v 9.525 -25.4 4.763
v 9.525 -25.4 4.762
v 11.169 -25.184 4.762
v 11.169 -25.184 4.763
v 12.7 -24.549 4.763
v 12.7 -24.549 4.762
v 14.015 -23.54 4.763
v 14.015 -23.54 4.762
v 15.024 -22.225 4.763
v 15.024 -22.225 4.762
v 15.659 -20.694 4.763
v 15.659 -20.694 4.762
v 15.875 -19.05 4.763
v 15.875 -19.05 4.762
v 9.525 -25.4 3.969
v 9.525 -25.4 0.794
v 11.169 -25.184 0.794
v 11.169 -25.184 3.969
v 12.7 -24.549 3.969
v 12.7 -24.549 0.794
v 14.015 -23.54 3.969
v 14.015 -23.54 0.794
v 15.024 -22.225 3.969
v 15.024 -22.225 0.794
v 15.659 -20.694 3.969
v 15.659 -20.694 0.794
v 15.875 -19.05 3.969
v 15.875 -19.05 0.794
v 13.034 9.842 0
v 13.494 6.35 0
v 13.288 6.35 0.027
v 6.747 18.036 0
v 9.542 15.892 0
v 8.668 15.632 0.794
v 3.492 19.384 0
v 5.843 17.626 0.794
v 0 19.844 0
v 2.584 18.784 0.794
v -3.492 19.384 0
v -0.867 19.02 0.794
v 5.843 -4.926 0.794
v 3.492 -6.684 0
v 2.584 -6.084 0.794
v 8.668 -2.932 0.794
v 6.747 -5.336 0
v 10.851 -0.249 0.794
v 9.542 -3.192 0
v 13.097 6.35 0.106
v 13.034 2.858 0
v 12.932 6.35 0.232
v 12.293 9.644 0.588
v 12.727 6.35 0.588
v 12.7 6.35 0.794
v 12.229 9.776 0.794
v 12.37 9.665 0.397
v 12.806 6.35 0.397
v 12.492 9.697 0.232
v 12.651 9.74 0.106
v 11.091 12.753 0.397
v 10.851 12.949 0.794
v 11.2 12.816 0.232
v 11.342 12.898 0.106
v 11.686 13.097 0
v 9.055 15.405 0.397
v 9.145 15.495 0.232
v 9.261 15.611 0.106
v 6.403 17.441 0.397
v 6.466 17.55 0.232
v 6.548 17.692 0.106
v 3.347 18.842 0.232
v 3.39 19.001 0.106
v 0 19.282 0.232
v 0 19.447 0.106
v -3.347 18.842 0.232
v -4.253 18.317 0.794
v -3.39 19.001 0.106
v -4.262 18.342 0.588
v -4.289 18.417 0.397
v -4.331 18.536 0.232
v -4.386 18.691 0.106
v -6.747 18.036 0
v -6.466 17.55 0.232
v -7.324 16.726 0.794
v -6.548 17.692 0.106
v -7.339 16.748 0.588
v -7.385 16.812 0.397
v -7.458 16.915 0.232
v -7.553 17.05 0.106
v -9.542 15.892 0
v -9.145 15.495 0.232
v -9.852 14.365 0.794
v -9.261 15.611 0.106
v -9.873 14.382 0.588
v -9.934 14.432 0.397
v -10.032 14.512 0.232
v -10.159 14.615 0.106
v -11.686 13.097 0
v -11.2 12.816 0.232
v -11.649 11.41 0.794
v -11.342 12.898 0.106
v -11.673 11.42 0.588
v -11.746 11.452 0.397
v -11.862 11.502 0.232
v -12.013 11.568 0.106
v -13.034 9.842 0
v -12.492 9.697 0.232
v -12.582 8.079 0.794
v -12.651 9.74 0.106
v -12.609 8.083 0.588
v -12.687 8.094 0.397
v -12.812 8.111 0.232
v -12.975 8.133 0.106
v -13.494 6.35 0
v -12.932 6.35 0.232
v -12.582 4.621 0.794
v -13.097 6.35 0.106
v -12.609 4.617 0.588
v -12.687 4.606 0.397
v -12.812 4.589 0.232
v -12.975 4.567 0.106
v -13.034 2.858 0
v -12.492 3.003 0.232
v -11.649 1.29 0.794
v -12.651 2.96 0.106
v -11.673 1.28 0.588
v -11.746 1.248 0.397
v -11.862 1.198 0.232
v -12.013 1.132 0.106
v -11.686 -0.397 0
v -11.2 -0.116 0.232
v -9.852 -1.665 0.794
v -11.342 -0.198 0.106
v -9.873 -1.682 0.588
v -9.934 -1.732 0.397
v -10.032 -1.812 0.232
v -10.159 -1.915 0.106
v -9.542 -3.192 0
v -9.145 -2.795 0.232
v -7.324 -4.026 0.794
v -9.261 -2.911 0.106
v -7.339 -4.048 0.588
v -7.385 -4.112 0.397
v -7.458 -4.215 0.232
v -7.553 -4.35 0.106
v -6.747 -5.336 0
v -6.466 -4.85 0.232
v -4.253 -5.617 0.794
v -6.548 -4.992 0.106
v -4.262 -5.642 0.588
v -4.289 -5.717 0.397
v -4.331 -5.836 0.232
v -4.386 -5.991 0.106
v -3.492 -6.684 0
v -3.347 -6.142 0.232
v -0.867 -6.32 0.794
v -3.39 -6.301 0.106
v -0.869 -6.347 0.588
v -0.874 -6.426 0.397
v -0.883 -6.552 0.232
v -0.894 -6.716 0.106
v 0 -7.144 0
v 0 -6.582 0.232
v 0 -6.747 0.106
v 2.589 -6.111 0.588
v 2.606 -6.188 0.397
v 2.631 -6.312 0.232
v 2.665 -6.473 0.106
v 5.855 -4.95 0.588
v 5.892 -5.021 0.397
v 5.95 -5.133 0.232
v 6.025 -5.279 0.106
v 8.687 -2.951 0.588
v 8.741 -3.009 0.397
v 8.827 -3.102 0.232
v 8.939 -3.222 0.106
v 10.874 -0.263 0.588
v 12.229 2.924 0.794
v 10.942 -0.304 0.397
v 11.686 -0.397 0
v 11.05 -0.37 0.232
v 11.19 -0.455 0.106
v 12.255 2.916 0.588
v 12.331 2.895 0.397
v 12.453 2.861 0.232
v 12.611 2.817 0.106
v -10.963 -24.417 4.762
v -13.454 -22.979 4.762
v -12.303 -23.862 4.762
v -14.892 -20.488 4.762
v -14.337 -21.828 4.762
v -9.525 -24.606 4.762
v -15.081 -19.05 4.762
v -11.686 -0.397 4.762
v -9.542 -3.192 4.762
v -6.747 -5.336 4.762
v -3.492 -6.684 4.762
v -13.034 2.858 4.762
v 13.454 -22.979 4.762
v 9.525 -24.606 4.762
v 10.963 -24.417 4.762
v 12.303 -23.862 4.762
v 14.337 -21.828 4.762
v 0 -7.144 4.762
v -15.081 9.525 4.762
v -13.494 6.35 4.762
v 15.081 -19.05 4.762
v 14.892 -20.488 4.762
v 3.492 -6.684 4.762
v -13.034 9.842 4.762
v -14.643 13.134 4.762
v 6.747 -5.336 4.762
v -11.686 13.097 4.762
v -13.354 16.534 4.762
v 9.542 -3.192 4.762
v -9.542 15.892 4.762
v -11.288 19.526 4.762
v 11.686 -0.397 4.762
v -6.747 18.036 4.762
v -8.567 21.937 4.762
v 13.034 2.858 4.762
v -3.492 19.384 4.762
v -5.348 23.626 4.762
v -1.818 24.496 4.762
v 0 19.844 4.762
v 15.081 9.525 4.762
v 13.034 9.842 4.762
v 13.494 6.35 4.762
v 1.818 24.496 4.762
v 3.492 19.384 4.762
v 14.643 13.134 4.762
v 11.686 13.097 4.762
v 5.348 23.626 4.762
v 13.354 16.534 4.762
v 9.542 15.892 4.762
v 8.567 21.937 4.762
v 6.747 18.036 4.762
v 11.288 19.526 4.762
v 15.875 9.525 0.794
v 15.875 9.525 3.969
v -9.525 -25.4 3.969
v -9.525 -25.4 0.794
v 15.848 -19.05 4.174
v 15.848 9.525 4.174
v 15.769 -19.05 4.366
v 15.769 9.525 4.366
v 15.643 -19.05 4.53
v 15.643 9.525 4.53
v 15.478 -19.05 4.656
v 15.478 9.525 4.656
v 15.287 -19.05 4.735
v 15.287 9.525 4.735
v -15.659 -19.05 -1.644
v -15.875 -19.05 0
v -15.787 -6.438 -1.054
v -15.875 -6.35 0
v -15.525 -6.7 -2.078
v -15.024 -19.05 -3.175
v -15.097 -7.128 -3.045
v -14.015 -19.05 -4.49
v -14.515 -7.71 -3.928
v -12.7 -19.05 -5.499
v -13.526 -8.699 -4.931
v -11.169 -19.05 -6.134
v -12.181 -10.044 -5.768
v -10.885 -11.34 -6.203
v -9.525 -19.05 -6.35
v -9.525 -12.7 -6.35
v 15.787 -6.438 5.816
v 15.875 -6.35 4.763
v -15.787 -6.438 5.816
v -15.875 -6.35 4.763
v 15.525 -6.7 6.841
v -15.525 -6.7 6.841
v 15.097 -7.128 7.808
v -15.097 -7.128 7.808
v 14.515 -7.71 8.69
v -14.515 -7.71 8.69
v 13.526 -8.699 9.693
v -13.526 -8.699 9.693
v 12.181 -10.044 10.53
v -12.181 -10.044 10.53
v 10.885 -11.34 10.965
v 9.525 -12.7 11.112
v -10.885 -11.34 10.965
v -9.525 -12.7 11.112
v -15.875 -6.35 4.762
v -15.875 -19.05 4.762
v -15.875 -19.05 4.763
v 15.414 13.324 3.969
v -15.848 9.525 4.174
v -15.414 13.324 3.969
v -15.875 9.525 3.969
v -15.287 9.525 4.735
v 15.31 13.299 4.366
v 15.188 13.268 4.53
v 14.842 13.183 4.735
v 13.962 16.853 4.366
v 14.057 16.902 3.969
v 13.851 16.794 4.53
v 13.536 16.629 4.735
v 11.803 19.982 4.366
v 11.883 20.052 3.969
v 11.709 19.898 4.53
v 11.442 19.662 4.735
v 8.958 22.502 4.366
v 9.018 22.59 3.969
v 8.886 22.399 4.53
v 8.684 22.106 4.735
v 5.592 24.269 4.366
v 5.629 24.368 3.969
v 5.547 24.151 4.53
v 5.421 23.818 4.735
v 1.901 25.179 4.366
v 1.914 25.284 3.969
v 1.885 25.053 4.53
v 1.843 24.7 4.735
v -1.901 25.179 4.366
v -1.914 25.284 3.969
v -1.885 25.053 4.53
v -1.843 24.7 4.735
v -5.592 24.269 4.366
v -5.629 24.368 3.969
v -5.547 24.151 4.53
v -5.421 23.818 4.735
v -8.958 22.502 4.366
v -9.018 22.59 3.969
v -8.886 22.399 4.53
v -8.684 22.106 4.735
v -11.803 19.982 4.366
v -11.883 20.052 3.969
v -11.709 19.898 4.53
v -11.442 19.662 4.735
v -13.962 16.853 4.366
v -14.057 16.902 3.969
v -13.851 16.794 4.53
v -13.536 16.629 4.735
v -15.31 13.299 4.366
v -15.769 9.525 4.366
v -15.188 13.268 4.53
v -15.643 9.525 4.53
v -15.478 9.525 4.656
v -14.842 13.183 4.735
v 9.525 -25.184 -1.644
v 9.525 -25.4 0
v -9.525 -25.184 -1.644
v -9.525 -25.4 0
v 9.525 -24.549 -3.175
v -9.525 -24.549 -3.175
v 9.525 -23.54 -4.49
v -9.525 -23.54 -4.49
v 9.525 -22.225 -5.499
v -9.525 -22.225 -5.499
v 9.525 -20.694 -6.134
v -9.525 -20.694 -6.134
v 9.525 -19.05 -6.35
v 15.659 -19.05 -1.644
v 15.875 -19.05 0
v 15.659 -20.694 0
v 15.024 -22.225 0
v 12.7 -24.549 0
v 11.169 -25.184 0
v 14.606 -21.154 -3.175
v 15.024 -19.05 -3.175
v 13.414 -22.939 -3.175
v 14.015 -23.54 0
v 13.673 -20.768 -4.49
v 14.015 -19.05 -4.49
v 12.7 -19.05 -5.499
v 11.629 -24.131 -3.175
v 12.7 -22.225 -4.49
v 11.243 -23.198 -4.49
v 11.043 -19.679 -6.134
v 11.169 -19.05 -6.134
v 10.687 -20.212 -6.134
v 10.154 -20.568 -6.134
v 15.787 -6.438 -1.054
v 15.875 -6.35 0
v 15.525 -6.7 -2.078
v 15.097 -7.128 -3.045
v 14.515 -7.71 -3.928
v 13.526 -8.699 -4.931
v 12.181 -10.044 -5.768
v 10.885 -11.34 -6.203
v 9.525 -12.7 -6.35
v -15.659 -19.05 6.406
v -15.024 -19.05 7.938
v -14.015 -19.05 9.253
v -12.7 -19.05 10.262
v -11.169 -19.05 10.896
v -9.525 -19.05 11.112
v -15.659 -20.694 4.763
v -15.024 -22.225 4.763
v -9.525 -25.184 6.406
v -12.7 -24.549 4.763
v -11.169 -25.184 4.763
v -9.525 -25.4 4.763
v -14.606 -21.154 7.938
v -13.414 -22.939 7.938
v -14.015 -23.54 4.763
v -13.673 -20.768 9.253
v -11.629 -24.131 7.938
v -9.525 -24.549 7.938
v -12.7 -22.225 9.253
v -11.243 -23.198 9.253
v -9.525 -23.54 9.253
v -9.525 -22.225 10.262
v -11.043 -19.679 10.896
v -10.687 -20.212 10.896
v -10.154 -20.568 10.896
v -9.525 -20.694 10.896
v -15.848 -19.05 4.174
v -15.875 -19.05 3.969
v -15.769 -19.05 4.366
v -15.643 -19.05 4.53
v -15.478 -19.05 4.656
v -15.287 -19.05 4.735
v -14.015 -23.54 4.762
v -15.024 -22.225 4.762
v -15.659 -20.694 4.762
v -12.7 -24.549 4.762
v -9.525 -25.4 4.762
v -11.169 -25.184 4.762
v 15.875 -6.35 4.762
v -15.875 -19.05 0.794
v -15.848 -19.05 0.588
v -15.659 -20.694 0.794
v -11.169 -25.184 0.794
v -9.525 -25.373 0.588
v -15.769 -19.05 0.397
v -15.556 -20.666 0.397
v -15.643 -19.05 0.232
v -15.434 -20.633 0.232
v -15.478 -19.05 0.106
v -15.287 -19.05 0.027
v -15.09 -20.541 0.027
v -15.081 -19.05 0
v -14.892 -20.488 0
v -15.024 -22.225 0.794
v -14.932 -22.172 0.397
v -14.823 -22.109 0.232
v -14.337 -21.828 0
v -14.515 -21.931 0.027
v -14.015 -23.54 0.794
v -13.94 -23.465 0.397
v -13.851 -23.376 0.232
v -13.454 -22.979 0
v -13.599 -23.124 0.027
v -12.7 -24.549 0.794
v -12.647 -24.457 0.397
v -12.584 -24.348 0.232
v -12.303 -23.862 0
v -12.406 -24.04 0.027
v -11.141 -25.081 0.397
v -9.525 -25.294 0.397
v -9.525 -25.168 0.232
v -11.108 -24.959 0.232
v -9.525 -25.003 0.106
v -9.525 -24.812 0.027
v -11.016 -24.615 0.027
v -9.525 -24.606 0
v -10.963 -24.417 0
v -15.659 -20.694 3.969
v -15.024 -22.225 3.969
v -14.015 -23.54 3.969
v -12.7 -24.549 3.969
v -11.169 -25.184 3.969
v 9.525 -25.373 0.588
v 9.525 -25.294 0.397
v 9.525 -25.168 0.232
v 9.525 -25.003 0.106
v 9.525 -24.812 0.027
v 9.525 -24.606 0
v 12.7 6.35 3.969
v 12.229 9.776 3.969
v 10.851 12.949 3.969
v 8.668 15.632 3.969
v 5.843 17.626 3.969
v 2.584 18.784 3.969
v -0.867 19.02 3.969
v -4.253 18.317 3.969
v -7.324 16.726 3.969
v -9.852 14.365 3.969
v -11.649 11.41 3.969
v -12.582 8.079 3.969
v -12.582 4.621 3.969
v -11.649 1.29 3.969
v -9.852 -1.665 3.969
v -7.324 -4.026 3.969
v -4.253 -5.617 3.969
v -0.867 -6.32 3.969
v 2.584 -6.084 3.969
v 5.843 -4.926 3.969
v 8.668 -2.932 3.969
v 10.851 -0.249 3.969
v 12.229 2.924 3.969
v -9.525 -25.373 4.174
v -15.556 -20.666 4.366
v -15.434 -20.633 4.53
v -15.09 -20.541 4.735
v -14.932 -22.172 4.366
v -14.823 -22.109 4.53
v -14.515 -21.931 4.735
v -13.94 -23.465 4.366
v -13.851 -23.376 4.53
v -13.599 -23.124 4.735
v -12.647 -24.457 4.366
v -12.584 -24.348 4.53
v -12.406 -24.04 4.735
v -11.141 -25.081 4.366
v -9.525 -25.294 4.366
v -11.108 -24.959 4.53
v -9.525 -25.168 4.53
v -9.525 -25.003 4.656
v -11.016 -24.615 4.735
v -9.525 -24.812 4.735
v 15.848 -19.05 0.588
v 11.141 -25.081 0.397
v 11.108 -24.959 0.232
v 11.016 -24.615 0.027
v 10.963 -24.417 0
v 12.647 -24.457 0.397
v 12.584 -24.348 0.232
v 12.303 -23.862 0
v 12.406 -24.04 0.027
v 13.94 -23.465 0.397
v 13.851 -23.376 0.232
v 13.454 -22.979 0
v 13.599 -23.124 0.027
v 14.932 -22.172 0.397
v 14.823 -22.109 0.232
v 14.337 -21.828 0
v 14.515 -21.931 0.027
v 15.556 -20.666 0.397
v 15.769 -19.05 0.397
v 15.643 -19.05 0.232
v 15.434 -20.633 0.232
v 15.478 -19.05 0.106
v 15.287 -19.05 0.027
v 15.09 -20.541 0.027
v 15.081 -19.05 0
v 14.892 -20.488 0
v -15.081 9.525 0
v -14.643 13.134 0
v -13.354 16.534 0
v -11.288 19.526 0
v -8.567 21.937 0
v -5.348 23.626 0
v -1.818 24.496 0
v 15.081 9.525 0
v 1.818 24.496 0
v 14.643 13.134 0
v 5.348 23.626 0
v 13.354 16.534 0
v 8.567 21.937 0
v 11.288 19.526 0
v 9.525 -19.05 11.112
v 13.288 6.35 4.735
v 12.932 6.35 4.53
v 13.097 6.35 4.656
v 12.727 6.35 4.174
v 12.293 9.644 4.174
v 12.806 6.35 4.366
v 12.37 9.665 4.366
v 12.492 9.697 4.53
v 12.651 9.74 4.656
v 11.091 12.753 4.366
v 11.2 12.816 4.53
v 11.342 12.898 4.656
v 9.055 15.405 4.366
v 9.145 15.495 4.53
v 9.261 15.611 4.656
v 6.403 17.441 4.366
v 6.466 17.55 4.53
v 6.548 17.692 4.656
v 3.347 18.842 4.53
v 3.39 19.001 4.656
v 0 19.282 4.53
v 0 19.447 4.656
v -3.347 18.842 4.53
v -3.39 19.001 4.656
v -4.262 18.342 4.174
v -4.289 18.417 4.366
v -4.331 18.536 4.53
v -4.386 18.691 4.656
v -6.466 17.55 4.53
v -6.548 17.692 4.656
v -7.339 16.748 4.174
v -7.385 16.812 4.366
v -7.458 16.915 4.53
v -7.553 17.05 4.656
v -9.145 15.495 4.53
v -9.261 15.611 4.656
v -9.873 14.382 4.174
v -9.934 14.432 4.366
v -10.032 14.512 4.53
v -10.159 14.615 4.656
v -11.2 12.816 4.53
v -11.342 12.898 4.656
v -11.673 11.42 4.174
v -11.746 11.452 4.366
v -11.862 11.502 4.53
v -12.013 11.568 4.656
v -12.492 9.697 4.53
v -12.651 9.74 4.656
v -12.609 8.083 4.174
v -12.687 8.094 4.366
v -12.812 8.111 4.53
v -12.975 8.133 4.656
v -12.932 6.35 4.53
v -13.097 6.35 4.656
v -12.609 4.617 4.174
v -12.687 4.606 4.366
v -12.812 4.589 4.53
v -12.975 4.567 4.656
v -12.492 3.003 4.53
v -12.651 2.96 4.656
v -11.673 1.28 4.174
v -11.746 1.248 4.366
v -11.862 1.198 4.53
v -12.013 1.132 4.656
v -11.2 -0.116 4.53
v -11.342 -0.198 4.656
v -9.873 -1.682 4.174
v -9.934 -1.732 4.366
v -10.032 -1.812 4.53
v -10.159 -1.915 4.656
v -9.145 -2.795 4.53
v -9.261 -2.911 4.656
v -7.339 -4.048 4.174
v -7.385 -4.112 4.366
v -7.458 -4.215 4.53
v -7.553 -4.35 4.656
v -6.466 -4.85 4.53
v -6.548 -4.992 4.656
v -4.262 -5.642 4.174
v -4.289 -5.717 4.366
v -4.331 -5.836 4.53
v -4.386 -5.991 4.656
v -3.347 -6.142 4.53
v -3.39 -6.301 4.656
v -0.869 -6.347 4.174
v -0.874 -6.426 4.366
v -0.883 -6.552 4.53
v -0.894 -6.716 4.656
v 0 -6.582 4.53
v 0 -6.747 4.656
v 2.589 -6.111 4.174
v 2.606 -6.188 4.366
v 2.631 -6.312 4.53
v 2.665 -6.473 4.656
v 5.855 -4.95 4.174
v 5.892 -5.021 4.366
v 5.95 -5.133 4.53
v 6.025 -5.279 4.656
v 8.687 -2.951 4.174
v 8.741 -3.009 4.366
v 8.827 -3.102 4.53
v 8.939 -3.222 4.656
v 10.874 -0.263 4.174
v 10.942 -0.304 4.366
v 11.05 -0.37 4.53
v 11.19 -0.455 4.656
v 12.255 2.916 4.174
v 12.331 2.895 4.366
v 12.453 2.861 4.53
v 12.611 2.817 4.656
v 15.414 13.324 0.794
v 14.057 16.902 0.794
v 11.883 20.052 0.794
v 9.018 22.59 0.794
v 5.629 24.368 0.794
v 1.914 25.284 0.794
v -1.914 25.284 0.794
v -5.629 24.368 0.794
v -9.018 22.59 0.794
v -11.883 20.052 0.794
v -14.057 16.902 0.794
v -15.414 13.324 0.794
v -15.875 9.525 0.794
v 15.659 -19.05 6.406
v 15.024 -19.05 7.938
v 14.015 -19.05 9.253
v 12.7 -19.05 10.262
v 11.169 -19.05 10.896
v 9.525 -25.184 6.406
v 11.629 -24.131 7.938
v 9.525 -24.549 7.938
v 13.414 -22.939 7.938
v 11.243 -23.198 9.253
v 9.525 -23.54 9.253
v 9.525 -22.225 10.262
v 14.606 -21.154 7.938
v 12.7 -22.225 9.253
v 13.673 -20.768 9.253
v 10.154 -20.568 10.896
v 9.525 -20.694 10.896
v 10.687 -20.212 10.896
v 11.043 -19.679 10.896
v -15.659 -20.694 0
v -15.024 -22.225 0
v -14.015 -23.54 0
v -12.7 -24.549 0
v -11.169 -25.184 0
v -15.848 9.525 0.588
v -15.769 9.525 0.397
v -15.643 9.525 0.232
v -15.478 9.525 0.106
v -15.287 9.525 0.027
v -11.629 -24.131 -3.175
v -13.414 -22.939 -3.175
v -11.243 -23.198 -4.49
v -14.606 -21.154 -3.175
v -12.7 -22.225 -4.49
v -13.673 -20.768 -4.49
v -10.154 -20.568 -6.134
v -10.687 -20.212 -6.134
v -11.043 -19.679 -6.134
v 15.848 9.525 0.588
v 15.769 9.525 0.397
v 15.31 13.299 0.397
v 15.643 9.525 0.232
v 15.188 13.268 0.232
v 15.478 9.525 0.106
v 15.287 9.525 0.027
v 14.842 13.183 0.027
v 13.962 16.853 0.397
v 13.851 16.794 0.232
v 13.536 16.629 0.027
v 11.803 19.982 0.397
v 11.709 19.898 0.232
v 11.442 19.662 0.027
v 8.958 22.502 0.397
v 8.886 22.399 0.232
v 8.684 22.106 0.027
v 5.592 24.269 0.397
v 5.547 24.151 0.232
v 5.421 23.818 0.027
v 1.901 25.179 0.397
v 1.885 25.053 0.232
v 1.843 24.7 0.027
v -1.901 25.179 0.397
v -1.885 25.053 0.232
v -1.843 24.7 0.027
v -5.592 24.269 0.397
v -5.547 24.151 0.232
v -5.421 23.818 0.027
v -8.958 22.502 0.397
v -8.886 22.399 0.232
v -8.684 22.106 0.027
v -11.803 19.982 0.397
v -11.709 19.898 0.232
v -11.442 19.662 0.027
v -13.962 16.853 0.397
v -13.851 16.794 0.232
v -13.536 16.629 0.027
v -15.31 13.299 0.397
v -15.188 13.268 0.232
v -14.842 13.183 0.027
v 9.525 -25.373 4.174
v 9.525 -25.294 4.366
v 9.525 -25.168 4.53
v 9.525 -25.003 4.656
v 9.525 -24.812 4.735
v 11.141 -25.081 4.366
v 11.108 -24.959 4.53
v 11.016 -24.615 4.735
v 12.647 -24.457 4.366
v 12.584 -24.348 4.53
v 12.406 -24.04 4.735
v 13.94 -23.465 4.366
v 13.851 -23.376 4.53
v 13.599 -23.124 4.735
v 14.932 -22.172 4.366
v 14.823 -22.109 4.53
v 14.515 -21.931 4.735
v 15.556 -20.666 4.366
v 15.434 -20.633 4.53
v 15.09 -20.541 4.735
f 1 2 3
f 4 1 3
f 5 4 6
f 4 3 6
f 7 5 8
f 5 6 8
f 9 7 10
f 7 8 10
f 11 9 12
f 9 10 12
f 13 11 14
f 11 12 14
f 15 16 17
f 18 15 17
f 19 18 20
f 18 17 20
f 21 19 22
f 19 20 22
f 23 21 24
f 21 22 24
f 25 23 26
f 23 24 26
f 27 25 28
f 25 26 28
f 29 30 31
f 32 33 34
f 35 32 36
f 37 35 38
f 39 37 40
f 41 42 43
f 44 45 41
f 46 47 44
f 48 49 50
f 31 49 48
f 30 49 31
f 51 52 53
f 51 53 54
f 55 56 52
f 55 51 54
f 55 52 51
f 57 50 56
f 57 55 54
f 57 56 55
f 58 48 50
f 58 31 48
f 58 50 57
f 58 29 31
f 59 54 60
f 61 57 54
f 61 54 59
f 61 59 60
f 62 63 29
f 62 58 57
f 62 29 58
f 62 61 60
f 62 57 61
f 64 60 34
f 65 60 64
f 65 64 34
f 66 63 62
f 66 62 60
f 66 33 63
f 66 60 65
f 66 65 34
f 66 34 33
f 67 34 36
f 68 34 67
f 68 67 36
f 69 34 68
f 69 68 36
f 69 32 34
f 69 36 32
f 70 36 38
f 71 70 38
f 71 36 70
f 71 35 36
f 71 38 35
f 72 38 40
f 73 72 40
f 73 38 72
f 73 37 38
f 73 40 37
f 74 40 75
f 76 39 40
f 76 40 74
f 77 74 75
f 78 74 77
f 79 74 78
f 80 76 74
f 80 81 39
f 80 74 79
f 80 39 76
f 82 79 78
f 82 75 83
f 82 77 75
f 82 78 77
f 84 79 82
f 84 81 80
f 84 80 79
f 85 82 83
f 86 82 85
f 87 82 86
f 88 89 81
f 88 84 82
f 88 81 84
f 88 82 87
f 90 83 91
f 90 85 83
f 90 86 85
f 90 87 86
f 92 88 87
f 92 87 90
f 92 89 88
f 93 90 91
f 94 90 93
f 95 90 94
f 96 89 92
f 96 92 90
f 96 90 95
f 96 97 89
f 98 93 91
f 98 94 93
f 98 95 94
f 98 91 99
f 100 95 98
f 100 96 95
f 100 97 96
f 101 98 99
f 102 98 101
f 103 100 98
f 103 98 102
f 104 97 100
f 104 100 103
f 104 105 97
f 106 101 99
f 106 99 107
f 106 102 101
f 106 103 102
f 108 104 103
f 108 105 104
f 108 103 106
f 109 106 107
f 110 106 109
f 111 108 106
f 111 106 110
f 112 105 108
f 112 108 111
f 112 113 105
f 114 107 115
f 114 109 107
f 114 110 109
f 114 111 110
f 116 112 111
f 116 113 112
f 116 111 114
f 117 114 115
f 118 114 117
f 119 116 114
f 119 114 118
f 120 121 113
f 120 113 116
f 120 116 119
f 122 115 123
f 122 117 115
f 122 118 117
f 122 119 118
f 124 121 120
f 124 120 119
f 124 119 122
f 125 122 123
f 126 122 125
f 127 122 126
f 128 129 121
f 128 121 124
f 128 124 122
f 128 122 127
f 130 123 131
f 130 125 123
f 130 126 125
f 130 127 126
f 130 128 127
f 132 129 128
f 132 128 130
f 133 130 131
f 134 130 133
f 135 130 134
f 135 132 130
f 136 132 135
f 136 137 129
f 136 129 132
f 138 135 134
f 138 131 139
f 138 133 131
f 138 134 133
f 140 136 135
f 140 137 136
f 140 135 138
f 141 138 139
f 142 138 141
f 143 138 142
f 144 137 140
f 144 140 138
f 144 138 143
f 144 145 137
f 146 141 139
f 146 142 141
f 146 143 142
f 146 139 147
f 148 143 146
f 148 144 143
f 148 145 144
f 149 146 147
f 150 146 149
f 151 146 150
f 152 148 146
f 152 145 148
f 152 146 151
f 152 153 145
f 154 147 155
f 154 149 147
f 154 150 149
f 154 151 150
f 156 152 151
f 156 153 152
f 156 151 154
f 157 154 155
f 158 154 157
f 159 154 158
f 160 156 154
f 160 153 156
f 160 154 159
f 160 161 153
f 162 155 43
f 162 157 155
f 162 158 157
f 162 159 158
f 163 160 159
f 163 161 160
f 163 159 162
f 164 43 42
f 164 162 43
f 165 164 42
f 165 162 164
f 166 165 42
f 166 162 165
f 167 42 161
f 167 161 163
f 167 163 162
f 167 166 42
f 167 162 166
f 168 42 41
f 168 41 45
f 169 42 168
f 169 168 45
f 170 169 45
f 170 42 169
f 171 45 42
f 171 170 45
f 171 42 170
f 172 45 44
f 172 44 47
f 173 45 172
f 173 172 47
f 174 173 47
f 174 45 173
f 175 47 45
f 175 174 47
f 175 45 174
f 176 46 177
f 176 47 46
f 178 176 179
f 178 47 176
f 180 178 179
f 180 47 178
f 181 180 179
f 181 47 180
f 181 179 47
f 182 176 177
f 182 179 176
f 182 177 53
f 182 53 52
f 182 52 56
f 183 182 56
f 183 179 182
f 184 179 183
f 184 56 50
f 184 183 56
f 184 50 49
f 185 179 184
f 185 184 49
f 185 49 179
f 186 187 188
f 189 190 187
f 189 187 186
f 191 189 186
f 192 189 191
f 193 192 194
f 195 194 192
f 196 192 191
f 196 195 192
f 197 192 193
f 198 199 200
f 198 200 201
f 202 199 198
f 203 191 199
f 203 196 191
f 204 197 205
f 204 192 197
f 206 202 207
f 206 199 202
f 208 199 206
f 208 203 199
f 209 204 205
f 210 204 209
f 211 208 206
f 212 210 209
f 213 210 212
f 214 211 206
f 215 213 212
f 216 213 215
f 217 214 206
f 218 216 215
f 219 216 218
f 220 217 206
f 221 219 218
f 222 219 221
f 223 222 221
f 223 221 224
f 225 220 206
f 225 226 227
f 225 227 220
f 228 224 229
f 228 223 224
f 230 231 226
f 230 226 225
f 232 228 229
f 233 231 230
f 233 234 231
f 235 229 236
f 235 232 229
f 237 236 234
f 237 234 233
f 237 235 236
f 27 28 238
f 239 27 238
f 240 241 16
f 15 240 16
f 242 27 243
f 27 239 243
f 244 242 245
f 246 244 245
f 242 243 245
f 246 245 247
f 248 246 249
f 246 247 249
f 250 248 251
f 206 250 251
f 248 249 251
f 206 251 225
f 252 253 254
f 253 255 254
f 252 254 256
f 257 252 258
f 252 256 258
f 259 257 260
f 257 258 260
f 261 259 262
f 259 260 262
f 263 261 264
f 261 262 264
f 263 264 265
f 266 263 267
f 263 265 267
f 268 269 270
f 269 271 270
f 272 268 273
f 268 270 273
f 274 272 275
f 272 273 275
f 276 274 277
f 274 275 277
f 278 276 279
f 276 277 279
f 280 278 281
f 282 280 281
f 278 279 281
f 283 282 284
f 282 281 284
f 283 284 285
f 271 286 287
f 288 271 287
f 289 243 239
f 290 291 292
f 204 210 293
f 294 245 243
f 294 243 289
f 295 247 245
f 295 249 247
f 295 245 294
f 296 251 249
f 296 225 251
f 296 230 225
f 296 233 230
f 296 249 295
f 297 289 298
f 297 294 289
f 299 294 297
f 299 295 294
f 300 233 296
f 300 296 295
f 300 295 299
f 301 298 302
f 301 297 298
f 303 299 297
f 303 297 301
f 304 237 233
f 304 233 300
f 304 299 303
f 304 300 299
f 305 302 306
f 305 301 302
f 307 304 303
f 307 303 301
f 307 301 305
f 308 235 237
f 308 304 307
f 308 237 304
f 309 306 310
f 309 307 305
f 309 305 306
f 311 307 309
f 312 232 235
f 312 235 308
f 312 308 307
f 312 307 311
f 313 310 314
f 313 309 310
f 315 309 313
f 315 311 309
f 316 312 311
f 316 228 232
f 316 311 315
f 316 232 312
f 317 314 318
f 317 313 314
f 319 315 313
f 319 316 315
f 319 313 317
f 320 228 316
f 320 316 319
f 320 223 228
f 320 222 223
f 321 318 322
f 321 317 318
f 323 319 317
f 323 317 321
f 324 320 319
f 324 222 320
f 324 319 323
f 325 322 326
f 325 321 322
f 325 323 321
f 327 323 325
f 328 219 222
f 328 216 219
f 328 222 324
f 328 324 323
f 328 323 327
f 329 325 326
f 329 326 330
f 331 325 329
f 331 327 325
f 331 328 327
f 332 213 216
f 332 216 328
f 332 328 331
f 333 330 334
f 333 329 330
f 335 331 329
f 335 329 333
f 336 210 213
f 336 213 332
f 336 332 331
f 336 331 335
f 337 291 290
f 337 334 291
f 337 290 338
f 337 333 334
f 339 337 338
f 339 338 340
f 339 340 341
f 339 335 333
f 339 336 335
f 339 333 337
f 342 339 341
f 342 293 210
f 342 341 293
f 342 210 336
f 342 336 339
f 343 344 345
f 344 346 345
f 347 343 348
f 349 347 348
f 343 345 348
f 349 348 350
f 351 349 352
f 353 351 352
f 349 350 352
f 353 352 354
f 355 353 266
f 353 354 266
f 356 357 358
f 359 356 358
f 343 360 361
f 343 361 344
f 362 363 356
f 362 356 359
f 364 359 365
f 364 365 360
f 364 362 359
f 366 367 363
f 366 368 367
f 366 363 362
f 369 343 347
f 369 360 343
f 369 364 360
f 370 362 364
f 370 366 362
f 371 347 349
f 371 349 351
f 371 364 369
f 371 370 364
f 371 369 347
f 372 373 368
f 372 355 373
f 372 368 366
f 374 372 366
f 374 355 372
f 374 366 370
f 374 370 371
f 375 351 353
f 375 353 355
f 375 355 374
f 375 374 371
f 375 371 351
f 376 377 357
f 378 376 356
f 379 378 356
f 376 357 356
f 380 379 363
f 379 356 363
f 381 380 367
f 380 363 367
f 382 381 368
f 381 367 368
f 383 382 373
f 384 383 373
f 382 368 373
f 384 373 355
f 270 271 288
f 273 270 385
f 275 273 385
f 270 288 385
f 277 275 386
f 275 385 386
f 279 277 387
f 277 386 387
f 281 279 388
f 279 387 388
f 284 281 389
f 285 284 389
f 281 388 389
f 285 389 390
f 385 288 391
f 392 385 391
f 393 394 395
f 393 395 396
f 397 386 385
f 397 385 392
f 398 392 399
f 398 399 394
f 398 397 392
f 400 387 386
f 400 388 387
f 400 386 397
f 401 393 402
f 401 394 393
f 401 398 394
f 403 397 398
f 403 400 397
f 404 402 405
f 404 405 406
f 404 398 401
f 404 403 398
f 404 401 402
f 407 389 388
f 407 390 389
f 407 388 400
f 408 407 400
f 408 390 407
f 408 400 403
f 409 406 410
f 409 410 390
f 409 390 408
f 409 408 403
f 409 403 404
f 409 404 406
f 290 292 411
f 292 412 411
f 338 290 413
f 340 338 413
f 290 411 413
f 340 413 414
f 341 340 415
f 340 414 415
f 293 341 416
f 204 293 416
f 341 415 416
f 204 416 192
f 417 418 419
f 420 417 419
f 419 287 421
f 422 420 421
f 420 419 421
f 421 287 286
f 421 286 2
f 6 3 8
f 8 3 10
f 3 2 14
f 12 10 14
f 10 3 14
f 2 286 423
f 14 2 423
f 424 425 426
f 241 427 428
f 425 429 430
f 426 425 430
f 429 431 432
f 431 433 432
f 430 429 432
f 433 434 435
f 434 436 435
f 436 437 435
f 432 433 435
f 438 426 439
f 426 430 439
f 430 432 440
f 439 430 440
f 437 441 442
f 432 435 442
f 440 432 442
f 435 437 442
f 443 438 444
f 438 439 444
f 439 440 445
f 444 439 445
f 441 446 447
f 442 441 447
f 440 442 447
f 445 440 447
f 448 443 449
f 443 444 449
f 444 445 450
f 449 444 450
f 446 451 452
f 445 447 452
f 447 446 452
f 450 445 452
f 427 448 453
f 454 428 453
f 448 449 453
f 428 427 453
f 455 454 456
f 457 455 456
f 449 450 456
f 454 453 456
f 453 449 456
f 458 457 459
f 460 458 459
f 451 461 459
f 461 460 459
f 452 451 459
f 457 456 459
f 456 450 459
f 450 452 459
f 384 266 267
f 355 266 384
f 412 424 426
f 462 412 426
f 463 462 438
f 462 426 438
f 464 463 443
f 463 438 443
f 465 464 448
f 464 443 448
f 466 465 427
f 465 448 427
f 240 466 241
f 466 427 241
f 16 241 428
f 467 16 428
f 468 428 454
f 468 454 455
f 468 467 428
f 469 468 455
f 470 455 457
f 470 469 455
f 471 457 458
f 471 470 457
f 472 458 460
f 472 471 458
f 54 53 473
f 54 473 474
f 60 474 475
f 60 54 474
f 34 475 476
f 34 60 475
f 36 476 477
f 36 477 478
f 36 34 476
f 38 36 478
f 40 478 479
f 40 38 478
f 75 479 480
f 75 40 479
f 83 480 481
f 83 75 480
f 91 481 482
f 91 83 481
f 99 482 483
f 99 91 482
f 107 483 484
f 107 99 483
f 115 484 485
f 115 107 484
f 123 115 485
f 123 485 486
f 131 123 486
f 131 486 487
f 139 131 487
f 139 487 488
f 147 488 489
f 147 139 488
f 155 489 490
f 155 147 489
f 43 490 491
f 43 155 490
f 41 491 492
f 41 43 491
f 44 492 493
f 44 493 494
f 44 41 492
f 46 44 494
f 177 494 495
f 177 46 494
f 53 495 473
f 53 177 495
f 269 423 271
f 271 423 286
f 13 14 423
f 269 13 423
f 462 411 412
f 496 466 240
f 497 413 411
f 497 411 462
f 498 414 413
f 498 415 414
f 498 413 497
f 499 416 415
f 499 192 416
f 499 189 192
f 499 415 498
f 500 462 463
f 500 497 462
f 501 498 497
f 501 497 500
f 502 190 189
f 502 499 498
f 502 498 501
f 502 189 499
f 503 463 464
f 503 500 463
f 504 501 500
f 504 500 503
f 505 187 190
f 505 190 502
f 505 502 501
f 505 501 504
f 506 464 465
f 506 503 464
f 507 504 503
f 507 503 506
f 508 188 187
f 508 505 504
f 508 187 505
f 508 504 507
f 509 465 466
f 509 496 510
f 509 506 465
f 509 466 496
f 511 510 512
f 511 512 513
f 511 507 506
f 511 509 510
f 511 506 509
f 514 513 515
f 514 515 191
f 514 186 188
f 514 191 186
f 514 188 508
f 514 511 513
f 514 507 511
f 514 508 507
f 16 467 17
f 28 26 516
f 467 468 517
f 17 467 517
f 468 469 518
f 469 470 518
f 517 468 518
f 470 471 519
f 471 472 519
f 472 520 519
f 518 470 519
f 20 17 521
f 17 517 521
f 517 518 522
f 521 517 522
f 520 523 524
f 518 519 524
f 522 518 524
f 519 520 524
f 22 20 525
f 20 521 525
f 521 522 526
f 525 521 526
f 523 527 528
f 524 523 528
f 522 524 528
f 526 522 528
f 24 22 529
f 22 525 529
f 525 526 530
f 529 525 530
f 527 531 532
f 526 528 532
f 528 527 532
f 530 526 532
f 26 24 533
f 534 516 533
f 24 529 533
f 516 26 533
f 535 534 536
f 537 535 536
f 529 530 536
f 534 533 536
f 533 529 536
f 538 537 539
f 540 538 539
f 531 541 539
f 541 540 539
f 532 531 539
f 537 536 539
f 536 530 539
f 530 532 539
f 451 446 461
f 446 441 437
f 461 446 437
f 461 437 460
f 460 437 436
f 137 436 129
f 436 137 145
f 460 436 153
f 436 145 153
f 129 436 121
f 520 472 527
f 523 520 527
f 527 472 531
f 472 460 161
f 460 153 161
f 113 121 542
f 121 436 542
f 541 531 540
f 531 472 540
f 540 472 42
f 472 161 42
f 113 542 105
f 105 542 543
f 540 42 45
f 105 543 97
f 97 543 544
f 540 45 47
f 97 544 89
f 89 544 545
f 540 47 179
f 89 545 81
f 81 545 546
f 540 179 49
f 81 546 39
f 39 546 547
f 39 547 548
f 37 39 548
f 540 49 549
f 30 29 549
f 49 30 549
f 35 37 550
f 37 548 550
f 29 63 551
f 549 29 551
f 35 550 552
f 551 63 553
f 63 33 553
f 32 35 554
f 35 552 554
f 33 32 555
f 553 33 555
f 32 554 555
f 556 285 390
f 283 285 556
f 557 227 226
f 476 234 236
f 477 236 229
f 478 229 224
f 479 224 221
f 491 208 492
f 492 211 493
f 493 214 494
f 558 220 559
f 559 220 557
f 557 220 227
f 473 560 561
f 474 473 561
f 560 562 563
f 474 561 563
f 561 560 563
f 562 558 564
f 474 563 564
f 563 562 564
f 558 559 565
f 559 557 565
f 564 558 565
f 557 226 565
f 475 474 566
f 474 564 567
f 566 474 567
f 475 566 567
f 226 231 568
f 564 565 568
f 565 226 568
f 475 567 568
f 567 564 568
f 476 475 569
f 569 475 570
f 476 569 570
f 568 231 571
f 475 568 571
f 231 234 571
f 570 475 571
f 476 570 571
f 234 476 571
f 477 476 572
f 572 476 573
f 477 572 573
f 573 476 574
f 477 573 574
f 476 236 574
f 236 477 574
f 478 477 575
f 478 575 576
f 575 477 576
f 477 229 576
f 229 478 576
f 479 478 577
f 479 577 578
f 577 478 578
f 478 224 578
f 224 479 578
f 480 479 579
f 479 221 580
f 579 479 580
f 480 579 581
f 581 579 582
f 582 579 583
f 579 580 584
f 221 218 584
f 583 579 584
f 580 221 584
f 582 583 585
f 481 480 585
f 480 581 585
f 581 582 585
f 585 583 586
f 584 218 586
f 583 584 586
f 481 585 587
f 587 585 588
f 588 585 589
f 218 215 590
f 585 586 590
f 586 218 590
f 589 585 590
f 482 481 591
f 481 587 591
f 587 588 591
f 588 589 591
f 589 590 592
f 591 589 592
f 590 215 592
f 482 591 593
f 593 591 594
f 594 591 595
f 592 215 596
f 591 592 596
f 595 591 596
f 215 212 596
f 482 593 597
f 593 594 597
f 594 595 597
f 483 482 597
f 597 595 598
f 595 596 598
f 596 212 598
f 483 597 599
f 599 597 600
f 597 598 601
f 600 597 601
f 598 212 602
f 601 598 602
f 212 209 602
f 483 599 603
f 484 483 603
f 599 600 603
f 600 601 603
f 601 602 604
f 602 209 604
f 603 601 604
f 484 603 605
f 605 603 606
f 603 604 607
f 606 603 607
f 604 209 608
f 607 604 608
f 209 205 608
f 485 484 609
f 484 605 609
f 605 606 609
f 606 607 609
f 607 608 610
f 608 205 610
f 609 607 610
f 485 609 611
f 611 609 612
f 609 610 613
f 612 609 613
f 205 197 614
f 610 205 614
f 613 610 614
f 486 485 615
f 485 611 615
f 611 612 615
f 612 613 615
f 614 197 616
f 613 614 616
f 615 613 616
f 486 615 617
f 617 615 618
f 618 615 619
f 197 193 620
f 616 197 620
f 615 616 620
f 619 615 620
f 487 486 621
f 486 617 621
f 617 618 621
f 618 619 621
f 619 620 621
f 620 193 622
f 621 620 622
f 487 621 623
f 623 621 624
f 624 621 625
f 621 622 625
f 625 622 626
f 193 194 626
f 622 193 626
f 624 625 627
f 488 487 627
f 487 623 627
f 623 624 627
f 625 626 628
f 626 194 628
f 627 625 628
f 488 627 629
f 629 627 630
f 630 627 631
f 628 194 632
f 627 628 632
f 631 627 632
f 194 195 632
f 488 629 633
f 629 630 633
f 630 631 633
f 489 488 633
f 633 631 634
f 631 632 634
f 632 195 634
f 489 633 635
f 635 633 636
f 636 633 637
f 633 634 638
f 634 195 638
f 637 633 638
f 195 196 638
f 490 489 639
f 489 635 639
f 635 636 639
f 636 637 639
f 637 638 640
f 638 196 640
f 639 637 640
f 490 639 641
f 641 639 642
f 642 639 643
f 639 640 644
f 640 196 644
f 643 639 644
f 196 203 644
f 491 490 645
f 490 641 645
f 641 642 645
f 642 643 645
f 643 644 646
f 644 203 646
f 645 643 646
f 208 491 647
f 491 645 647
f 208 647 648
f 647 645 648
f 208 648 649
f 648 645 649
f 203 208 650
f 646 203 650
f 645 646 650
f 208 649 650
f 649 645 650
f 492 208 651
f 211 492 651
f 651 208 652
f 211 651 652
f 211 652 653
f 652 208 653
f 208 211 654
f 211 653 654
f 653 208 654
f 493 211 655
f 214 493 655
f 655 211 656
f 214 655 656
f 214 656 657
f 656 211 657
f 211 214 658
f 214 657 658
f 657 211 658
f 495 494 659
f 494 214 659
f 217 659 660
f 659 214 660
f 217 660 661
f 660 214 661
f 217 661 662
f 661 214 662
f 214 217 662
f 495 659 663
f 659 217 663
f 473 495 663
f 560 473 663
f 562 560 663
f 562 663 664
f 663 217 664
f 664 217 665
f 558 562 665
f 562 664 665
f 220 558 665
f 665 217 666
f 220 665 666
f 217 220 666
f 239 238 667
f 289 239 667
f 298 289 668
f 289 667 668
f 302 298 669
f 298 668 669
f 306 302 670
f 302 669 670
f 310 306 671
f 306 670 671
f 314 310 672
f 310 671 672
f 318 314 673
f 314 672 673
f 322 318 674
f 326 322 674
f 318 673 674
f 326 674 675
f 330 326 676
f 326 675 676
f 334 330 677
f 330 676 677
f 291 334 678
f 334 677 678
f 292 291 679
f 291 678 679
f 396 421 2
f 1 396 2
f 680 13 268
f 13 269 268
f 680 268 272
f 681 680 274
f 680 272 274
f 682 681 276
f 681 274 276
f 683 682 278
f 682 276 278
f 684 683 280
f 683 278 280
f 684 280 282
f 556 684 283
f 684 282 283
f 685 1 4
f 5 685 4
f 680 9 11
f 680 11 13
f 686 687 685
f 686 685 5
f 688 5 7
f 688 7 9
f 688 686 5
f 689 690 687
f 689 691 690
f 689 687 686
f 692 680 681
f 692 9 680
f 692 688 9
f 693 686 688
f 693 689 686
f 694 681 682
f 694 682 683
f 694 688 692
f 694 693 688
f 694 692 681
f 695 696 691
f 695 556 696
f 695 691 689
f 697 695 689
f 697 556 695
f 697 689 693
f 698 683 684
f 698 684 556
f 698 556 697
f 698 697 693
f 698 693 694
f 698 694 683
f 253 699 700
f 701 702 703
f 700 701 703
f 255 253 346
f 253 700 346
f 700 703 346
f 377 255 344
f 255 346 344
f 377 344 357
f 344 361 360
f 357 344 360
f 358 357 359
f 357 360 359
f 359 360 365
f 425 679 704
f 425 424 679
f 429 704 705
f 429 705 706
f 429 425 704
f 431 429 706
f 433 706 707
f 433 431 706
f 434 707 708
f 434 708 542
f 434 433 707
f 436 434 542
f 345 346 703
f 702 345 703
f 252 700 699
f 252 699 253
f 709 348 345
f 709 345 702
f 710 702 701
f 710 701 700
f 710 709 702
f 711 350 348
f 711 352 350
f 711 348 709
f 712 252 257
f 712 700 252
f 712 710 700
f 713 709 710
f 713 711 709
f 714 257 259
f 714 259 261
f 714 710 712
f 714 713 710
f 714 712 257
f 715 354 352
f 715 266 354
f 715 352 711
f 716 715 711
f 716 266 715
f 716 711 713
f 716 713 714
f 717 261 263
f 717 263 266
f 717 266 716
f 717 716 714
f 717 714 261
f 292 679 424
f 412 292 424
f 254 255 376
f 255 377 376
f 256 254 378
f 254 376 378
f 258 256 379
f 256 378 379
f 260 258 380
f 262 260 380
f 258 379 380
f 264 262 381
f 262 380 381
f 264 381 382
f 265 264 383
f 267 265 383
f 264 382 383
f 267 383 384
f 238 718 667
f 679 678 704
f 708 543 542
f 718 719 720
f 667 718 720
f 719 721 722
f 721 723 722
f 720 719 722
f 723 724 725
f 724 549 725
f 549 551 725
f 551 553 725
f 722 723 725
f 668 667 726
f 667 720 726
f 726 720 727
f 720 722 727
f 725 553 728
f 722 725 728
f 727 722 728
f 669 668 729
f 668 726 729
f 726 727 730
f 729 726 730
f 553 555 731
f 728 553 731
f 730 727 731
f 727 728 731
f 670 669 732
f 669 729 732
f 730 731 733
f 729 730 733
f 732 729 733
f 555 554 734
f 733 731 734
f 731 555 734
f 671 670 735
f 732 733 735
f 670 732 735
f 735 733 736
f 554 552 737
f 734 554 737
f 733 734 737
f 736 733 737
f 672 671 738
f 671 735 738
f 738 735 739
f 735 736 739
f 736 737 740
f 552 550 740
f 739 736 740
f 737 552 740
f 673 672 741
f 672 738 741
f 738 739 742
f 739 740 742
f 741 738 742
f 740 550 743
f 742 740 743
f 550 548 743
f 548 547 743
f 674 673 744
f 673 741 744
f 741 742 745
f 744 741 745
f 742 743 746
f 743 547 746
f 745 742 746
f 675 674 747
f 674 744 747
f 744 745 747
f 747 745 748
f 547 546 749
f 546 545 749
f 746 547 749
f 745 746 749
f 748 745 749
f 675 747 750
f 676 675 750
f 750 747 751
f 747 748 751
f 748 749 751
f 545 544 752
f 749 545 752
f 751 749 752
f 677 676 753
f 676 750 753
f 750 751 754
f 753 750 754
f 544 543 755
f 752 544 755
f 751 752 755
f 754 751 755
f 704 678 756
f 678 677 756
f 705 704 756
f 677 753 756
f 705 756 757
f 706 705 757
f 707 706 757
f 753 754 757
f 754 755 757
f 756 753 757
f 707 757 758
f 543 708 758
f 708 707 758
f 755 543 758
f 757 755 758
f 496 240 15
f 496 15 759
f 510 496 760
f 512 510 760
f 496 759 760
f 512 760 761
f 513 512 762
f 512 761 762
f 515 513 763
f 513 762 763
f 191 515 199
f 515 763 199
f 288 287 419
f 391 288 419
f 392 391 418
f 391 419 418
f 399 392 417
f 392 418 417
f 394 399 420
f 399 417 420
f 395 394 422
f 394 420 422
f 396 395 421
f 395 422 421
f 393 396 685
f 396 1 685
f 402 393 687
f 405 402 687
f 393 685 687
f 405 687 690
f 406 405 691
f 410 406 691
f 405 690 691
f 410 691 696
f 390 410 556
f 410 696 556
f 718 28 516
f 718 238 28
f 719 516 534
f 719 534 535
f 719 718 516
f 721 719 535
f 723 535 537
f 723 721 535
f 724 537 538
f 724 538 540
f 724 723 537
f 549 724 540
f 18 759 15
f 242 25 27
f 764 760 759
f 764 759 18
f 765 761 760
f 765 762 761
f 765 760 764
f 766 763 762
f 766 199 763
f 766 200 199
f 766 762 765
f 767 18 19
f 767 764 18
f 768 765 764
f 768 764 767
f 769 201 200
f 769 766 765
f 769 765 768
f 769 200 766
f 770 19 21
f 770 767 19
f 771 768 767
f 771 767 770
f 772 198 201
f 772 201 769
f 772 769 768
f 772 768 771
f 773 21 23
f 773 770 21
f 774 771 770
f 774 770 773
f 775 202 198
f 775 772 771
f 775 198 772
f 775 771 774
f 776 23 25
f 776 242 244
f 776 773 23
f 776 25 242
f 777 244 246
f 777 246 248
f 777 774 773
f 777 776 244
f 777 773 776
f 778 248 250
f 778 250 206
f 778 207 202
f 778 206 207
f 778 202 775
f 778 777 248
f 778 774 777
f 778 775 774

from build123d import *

# Parameters (mm, degrees)
F0_R     = 12.7
F1_DEPTH = 4.7625
F3_DEPTH = 6.35
F5_DEPTH = 6.35
F6_R     = 6.34999
F6_2_R   = 6.34999
F7_R     = 0.79375


# Not quite as in the source:
# - a fillet or chamfer is up to 0.001 mm smaller than in the source, because OpenCascade refuses the exact size


with BuildPart() as f1:
    # F0 (on Top) → F1 (new body)
    with BuildSketch(Plane.XY):
        with BuildLine():
            Line((-9.525, -25.4), (9.525, -25.4))
            ThreePointArc((9.525, -25.4), (14.0151280605, -23.5401280605), (15.875, -19.05))
            Line((15.875, -19.05), (15.875, 9.525))
            ThreePointArc((15.875, 9.525), (0, 25.4), (-15.875, 9.525))
            Line((-15.875, 9.525), (-15.875, -19.05))
            ThreePointArc((-15.875, -19.05), (-14.0151280605, -23.5401280605), (-9.525, -25.4))
        make_face()
        with Locations((0, 6.35)):
            Circle(F0_R, mode=Mode.SUBTRACT)
    extrude(amount=F1_DEPTH)

    # F7
    f7_edges = [f1.edges().sort_by_distance(p)[0] for p in [
        (-15.875, -4.7625, 4.7625),
        (-14.015128, -23.540128, 4.7625),
        (0, -25.4, 4.7625),
        (14.015128, -23.540128, 4.7625),
        (15.875, -4.7625, 4.7625),
        (0, 25.4, 4.7625),
        (-12.7, 6.35, 4.7625),
        (-15.875, -4.7625, 0),
        (-14.015128, -23.540128, 0),
        (0, -25.4, 0),
        (14.015128, -23.540128, 0),
        (15.875, -4.7625, 0),
        (0, 25.4, 0),
        (-12.7, 6.35, 0),
    ]]
    fillet(f7_edges, radius=F7_R)


with BuildPart() as f3:
    # F2 (on face) → F3 (new body)
    with BuildSketch(Plane.XY.offset(4.7625)):
        with BuildLine():
            Line((15.875, -6.35), (0, -6.35))
            Line((0, -6.35), (-15.875, -6.35))
            Line((-15.875, -6.35), (-15.875, -19.05))
            ThreePointArc((-15.875, -19.05), (-14.0151280605, -23.5401280605), (-9.525, -25.4))
            Line((-9.525, -25.4), (9.525, -25.4))
            ThreePointArc((9.525, -25.4), (14.0151280605, -23.5401280605), (15.875, -19.05))
            Line((15.875, -19.05), (15.875, -6.35))
        make_face()
    extrude(amount=F3_DEPTH)

    # F6#2 (radius 6.35 in the source; OpenCascade refuses exactly that, so slightly less here)
    f6_2_edges = [f3.edges().sort_by_distance(p)[0] for p in [
        (0, -6.35, 11.1125),
        (-15.875, -12.7, 11.1125),
        (-14.015128, -23.540128, 11.1125),
        (0, -25.4, 11.1125),
        (14.015128, -23.540128, 11.1125),
        (15.875, -12.7, 11.1125),
    ]]
    fillet(f6_2_edges, radius=F6_2_R)


with BuildPart() as f5:
    # F4 (on face) → F5 (new body)
    with BuildSketch(Plane(origin=(0, 0, 0), x_dir=(1, 0, 0), z_dir=(0, 0, -1))):
        with BuildLine():
            Line((-15.875, 6.35), (0, 6.35))
            Line((0, 6.35), (15.875, 6.35))
            Line((15.875, 6.35), (15.875, 19.05))
            ThreePointArc((15.875, 19.05), (14.0151280605, 23.5401280605), (9.525, 25.4))
            Line((9.525, 25.4), (-9.525, 25.4))
            ThreePointArc((-9.525, 25.4), (-14.0151280605, 23.5401280605), (-15.875, 19.05))
            Line((-15.875, 19.05), (-15.875, 6.35))
        make_face()
    extrude(amount=F5_DEPTH)

    # F6 (radius 6.35 in the source; OpenCascade refuses exactly that, so slightly less here)
    f6_edges = [f5.edges().sort_by_distance(p)[0] for p in [
        (-15.875, -12.7, -6.35),
        (0, -6.35, -6.35),
        (15.875, -12.7, -6.35),
        (14.015128, -23.540128, -6.35),
        (0, -25.4, -6.35),
        (-14.015128, -23.540128, -6.35),
    ]]
    fillet(f6_edges, radius=F6_R)


solid = Compound([f1.part, f3.part, f5.part])
